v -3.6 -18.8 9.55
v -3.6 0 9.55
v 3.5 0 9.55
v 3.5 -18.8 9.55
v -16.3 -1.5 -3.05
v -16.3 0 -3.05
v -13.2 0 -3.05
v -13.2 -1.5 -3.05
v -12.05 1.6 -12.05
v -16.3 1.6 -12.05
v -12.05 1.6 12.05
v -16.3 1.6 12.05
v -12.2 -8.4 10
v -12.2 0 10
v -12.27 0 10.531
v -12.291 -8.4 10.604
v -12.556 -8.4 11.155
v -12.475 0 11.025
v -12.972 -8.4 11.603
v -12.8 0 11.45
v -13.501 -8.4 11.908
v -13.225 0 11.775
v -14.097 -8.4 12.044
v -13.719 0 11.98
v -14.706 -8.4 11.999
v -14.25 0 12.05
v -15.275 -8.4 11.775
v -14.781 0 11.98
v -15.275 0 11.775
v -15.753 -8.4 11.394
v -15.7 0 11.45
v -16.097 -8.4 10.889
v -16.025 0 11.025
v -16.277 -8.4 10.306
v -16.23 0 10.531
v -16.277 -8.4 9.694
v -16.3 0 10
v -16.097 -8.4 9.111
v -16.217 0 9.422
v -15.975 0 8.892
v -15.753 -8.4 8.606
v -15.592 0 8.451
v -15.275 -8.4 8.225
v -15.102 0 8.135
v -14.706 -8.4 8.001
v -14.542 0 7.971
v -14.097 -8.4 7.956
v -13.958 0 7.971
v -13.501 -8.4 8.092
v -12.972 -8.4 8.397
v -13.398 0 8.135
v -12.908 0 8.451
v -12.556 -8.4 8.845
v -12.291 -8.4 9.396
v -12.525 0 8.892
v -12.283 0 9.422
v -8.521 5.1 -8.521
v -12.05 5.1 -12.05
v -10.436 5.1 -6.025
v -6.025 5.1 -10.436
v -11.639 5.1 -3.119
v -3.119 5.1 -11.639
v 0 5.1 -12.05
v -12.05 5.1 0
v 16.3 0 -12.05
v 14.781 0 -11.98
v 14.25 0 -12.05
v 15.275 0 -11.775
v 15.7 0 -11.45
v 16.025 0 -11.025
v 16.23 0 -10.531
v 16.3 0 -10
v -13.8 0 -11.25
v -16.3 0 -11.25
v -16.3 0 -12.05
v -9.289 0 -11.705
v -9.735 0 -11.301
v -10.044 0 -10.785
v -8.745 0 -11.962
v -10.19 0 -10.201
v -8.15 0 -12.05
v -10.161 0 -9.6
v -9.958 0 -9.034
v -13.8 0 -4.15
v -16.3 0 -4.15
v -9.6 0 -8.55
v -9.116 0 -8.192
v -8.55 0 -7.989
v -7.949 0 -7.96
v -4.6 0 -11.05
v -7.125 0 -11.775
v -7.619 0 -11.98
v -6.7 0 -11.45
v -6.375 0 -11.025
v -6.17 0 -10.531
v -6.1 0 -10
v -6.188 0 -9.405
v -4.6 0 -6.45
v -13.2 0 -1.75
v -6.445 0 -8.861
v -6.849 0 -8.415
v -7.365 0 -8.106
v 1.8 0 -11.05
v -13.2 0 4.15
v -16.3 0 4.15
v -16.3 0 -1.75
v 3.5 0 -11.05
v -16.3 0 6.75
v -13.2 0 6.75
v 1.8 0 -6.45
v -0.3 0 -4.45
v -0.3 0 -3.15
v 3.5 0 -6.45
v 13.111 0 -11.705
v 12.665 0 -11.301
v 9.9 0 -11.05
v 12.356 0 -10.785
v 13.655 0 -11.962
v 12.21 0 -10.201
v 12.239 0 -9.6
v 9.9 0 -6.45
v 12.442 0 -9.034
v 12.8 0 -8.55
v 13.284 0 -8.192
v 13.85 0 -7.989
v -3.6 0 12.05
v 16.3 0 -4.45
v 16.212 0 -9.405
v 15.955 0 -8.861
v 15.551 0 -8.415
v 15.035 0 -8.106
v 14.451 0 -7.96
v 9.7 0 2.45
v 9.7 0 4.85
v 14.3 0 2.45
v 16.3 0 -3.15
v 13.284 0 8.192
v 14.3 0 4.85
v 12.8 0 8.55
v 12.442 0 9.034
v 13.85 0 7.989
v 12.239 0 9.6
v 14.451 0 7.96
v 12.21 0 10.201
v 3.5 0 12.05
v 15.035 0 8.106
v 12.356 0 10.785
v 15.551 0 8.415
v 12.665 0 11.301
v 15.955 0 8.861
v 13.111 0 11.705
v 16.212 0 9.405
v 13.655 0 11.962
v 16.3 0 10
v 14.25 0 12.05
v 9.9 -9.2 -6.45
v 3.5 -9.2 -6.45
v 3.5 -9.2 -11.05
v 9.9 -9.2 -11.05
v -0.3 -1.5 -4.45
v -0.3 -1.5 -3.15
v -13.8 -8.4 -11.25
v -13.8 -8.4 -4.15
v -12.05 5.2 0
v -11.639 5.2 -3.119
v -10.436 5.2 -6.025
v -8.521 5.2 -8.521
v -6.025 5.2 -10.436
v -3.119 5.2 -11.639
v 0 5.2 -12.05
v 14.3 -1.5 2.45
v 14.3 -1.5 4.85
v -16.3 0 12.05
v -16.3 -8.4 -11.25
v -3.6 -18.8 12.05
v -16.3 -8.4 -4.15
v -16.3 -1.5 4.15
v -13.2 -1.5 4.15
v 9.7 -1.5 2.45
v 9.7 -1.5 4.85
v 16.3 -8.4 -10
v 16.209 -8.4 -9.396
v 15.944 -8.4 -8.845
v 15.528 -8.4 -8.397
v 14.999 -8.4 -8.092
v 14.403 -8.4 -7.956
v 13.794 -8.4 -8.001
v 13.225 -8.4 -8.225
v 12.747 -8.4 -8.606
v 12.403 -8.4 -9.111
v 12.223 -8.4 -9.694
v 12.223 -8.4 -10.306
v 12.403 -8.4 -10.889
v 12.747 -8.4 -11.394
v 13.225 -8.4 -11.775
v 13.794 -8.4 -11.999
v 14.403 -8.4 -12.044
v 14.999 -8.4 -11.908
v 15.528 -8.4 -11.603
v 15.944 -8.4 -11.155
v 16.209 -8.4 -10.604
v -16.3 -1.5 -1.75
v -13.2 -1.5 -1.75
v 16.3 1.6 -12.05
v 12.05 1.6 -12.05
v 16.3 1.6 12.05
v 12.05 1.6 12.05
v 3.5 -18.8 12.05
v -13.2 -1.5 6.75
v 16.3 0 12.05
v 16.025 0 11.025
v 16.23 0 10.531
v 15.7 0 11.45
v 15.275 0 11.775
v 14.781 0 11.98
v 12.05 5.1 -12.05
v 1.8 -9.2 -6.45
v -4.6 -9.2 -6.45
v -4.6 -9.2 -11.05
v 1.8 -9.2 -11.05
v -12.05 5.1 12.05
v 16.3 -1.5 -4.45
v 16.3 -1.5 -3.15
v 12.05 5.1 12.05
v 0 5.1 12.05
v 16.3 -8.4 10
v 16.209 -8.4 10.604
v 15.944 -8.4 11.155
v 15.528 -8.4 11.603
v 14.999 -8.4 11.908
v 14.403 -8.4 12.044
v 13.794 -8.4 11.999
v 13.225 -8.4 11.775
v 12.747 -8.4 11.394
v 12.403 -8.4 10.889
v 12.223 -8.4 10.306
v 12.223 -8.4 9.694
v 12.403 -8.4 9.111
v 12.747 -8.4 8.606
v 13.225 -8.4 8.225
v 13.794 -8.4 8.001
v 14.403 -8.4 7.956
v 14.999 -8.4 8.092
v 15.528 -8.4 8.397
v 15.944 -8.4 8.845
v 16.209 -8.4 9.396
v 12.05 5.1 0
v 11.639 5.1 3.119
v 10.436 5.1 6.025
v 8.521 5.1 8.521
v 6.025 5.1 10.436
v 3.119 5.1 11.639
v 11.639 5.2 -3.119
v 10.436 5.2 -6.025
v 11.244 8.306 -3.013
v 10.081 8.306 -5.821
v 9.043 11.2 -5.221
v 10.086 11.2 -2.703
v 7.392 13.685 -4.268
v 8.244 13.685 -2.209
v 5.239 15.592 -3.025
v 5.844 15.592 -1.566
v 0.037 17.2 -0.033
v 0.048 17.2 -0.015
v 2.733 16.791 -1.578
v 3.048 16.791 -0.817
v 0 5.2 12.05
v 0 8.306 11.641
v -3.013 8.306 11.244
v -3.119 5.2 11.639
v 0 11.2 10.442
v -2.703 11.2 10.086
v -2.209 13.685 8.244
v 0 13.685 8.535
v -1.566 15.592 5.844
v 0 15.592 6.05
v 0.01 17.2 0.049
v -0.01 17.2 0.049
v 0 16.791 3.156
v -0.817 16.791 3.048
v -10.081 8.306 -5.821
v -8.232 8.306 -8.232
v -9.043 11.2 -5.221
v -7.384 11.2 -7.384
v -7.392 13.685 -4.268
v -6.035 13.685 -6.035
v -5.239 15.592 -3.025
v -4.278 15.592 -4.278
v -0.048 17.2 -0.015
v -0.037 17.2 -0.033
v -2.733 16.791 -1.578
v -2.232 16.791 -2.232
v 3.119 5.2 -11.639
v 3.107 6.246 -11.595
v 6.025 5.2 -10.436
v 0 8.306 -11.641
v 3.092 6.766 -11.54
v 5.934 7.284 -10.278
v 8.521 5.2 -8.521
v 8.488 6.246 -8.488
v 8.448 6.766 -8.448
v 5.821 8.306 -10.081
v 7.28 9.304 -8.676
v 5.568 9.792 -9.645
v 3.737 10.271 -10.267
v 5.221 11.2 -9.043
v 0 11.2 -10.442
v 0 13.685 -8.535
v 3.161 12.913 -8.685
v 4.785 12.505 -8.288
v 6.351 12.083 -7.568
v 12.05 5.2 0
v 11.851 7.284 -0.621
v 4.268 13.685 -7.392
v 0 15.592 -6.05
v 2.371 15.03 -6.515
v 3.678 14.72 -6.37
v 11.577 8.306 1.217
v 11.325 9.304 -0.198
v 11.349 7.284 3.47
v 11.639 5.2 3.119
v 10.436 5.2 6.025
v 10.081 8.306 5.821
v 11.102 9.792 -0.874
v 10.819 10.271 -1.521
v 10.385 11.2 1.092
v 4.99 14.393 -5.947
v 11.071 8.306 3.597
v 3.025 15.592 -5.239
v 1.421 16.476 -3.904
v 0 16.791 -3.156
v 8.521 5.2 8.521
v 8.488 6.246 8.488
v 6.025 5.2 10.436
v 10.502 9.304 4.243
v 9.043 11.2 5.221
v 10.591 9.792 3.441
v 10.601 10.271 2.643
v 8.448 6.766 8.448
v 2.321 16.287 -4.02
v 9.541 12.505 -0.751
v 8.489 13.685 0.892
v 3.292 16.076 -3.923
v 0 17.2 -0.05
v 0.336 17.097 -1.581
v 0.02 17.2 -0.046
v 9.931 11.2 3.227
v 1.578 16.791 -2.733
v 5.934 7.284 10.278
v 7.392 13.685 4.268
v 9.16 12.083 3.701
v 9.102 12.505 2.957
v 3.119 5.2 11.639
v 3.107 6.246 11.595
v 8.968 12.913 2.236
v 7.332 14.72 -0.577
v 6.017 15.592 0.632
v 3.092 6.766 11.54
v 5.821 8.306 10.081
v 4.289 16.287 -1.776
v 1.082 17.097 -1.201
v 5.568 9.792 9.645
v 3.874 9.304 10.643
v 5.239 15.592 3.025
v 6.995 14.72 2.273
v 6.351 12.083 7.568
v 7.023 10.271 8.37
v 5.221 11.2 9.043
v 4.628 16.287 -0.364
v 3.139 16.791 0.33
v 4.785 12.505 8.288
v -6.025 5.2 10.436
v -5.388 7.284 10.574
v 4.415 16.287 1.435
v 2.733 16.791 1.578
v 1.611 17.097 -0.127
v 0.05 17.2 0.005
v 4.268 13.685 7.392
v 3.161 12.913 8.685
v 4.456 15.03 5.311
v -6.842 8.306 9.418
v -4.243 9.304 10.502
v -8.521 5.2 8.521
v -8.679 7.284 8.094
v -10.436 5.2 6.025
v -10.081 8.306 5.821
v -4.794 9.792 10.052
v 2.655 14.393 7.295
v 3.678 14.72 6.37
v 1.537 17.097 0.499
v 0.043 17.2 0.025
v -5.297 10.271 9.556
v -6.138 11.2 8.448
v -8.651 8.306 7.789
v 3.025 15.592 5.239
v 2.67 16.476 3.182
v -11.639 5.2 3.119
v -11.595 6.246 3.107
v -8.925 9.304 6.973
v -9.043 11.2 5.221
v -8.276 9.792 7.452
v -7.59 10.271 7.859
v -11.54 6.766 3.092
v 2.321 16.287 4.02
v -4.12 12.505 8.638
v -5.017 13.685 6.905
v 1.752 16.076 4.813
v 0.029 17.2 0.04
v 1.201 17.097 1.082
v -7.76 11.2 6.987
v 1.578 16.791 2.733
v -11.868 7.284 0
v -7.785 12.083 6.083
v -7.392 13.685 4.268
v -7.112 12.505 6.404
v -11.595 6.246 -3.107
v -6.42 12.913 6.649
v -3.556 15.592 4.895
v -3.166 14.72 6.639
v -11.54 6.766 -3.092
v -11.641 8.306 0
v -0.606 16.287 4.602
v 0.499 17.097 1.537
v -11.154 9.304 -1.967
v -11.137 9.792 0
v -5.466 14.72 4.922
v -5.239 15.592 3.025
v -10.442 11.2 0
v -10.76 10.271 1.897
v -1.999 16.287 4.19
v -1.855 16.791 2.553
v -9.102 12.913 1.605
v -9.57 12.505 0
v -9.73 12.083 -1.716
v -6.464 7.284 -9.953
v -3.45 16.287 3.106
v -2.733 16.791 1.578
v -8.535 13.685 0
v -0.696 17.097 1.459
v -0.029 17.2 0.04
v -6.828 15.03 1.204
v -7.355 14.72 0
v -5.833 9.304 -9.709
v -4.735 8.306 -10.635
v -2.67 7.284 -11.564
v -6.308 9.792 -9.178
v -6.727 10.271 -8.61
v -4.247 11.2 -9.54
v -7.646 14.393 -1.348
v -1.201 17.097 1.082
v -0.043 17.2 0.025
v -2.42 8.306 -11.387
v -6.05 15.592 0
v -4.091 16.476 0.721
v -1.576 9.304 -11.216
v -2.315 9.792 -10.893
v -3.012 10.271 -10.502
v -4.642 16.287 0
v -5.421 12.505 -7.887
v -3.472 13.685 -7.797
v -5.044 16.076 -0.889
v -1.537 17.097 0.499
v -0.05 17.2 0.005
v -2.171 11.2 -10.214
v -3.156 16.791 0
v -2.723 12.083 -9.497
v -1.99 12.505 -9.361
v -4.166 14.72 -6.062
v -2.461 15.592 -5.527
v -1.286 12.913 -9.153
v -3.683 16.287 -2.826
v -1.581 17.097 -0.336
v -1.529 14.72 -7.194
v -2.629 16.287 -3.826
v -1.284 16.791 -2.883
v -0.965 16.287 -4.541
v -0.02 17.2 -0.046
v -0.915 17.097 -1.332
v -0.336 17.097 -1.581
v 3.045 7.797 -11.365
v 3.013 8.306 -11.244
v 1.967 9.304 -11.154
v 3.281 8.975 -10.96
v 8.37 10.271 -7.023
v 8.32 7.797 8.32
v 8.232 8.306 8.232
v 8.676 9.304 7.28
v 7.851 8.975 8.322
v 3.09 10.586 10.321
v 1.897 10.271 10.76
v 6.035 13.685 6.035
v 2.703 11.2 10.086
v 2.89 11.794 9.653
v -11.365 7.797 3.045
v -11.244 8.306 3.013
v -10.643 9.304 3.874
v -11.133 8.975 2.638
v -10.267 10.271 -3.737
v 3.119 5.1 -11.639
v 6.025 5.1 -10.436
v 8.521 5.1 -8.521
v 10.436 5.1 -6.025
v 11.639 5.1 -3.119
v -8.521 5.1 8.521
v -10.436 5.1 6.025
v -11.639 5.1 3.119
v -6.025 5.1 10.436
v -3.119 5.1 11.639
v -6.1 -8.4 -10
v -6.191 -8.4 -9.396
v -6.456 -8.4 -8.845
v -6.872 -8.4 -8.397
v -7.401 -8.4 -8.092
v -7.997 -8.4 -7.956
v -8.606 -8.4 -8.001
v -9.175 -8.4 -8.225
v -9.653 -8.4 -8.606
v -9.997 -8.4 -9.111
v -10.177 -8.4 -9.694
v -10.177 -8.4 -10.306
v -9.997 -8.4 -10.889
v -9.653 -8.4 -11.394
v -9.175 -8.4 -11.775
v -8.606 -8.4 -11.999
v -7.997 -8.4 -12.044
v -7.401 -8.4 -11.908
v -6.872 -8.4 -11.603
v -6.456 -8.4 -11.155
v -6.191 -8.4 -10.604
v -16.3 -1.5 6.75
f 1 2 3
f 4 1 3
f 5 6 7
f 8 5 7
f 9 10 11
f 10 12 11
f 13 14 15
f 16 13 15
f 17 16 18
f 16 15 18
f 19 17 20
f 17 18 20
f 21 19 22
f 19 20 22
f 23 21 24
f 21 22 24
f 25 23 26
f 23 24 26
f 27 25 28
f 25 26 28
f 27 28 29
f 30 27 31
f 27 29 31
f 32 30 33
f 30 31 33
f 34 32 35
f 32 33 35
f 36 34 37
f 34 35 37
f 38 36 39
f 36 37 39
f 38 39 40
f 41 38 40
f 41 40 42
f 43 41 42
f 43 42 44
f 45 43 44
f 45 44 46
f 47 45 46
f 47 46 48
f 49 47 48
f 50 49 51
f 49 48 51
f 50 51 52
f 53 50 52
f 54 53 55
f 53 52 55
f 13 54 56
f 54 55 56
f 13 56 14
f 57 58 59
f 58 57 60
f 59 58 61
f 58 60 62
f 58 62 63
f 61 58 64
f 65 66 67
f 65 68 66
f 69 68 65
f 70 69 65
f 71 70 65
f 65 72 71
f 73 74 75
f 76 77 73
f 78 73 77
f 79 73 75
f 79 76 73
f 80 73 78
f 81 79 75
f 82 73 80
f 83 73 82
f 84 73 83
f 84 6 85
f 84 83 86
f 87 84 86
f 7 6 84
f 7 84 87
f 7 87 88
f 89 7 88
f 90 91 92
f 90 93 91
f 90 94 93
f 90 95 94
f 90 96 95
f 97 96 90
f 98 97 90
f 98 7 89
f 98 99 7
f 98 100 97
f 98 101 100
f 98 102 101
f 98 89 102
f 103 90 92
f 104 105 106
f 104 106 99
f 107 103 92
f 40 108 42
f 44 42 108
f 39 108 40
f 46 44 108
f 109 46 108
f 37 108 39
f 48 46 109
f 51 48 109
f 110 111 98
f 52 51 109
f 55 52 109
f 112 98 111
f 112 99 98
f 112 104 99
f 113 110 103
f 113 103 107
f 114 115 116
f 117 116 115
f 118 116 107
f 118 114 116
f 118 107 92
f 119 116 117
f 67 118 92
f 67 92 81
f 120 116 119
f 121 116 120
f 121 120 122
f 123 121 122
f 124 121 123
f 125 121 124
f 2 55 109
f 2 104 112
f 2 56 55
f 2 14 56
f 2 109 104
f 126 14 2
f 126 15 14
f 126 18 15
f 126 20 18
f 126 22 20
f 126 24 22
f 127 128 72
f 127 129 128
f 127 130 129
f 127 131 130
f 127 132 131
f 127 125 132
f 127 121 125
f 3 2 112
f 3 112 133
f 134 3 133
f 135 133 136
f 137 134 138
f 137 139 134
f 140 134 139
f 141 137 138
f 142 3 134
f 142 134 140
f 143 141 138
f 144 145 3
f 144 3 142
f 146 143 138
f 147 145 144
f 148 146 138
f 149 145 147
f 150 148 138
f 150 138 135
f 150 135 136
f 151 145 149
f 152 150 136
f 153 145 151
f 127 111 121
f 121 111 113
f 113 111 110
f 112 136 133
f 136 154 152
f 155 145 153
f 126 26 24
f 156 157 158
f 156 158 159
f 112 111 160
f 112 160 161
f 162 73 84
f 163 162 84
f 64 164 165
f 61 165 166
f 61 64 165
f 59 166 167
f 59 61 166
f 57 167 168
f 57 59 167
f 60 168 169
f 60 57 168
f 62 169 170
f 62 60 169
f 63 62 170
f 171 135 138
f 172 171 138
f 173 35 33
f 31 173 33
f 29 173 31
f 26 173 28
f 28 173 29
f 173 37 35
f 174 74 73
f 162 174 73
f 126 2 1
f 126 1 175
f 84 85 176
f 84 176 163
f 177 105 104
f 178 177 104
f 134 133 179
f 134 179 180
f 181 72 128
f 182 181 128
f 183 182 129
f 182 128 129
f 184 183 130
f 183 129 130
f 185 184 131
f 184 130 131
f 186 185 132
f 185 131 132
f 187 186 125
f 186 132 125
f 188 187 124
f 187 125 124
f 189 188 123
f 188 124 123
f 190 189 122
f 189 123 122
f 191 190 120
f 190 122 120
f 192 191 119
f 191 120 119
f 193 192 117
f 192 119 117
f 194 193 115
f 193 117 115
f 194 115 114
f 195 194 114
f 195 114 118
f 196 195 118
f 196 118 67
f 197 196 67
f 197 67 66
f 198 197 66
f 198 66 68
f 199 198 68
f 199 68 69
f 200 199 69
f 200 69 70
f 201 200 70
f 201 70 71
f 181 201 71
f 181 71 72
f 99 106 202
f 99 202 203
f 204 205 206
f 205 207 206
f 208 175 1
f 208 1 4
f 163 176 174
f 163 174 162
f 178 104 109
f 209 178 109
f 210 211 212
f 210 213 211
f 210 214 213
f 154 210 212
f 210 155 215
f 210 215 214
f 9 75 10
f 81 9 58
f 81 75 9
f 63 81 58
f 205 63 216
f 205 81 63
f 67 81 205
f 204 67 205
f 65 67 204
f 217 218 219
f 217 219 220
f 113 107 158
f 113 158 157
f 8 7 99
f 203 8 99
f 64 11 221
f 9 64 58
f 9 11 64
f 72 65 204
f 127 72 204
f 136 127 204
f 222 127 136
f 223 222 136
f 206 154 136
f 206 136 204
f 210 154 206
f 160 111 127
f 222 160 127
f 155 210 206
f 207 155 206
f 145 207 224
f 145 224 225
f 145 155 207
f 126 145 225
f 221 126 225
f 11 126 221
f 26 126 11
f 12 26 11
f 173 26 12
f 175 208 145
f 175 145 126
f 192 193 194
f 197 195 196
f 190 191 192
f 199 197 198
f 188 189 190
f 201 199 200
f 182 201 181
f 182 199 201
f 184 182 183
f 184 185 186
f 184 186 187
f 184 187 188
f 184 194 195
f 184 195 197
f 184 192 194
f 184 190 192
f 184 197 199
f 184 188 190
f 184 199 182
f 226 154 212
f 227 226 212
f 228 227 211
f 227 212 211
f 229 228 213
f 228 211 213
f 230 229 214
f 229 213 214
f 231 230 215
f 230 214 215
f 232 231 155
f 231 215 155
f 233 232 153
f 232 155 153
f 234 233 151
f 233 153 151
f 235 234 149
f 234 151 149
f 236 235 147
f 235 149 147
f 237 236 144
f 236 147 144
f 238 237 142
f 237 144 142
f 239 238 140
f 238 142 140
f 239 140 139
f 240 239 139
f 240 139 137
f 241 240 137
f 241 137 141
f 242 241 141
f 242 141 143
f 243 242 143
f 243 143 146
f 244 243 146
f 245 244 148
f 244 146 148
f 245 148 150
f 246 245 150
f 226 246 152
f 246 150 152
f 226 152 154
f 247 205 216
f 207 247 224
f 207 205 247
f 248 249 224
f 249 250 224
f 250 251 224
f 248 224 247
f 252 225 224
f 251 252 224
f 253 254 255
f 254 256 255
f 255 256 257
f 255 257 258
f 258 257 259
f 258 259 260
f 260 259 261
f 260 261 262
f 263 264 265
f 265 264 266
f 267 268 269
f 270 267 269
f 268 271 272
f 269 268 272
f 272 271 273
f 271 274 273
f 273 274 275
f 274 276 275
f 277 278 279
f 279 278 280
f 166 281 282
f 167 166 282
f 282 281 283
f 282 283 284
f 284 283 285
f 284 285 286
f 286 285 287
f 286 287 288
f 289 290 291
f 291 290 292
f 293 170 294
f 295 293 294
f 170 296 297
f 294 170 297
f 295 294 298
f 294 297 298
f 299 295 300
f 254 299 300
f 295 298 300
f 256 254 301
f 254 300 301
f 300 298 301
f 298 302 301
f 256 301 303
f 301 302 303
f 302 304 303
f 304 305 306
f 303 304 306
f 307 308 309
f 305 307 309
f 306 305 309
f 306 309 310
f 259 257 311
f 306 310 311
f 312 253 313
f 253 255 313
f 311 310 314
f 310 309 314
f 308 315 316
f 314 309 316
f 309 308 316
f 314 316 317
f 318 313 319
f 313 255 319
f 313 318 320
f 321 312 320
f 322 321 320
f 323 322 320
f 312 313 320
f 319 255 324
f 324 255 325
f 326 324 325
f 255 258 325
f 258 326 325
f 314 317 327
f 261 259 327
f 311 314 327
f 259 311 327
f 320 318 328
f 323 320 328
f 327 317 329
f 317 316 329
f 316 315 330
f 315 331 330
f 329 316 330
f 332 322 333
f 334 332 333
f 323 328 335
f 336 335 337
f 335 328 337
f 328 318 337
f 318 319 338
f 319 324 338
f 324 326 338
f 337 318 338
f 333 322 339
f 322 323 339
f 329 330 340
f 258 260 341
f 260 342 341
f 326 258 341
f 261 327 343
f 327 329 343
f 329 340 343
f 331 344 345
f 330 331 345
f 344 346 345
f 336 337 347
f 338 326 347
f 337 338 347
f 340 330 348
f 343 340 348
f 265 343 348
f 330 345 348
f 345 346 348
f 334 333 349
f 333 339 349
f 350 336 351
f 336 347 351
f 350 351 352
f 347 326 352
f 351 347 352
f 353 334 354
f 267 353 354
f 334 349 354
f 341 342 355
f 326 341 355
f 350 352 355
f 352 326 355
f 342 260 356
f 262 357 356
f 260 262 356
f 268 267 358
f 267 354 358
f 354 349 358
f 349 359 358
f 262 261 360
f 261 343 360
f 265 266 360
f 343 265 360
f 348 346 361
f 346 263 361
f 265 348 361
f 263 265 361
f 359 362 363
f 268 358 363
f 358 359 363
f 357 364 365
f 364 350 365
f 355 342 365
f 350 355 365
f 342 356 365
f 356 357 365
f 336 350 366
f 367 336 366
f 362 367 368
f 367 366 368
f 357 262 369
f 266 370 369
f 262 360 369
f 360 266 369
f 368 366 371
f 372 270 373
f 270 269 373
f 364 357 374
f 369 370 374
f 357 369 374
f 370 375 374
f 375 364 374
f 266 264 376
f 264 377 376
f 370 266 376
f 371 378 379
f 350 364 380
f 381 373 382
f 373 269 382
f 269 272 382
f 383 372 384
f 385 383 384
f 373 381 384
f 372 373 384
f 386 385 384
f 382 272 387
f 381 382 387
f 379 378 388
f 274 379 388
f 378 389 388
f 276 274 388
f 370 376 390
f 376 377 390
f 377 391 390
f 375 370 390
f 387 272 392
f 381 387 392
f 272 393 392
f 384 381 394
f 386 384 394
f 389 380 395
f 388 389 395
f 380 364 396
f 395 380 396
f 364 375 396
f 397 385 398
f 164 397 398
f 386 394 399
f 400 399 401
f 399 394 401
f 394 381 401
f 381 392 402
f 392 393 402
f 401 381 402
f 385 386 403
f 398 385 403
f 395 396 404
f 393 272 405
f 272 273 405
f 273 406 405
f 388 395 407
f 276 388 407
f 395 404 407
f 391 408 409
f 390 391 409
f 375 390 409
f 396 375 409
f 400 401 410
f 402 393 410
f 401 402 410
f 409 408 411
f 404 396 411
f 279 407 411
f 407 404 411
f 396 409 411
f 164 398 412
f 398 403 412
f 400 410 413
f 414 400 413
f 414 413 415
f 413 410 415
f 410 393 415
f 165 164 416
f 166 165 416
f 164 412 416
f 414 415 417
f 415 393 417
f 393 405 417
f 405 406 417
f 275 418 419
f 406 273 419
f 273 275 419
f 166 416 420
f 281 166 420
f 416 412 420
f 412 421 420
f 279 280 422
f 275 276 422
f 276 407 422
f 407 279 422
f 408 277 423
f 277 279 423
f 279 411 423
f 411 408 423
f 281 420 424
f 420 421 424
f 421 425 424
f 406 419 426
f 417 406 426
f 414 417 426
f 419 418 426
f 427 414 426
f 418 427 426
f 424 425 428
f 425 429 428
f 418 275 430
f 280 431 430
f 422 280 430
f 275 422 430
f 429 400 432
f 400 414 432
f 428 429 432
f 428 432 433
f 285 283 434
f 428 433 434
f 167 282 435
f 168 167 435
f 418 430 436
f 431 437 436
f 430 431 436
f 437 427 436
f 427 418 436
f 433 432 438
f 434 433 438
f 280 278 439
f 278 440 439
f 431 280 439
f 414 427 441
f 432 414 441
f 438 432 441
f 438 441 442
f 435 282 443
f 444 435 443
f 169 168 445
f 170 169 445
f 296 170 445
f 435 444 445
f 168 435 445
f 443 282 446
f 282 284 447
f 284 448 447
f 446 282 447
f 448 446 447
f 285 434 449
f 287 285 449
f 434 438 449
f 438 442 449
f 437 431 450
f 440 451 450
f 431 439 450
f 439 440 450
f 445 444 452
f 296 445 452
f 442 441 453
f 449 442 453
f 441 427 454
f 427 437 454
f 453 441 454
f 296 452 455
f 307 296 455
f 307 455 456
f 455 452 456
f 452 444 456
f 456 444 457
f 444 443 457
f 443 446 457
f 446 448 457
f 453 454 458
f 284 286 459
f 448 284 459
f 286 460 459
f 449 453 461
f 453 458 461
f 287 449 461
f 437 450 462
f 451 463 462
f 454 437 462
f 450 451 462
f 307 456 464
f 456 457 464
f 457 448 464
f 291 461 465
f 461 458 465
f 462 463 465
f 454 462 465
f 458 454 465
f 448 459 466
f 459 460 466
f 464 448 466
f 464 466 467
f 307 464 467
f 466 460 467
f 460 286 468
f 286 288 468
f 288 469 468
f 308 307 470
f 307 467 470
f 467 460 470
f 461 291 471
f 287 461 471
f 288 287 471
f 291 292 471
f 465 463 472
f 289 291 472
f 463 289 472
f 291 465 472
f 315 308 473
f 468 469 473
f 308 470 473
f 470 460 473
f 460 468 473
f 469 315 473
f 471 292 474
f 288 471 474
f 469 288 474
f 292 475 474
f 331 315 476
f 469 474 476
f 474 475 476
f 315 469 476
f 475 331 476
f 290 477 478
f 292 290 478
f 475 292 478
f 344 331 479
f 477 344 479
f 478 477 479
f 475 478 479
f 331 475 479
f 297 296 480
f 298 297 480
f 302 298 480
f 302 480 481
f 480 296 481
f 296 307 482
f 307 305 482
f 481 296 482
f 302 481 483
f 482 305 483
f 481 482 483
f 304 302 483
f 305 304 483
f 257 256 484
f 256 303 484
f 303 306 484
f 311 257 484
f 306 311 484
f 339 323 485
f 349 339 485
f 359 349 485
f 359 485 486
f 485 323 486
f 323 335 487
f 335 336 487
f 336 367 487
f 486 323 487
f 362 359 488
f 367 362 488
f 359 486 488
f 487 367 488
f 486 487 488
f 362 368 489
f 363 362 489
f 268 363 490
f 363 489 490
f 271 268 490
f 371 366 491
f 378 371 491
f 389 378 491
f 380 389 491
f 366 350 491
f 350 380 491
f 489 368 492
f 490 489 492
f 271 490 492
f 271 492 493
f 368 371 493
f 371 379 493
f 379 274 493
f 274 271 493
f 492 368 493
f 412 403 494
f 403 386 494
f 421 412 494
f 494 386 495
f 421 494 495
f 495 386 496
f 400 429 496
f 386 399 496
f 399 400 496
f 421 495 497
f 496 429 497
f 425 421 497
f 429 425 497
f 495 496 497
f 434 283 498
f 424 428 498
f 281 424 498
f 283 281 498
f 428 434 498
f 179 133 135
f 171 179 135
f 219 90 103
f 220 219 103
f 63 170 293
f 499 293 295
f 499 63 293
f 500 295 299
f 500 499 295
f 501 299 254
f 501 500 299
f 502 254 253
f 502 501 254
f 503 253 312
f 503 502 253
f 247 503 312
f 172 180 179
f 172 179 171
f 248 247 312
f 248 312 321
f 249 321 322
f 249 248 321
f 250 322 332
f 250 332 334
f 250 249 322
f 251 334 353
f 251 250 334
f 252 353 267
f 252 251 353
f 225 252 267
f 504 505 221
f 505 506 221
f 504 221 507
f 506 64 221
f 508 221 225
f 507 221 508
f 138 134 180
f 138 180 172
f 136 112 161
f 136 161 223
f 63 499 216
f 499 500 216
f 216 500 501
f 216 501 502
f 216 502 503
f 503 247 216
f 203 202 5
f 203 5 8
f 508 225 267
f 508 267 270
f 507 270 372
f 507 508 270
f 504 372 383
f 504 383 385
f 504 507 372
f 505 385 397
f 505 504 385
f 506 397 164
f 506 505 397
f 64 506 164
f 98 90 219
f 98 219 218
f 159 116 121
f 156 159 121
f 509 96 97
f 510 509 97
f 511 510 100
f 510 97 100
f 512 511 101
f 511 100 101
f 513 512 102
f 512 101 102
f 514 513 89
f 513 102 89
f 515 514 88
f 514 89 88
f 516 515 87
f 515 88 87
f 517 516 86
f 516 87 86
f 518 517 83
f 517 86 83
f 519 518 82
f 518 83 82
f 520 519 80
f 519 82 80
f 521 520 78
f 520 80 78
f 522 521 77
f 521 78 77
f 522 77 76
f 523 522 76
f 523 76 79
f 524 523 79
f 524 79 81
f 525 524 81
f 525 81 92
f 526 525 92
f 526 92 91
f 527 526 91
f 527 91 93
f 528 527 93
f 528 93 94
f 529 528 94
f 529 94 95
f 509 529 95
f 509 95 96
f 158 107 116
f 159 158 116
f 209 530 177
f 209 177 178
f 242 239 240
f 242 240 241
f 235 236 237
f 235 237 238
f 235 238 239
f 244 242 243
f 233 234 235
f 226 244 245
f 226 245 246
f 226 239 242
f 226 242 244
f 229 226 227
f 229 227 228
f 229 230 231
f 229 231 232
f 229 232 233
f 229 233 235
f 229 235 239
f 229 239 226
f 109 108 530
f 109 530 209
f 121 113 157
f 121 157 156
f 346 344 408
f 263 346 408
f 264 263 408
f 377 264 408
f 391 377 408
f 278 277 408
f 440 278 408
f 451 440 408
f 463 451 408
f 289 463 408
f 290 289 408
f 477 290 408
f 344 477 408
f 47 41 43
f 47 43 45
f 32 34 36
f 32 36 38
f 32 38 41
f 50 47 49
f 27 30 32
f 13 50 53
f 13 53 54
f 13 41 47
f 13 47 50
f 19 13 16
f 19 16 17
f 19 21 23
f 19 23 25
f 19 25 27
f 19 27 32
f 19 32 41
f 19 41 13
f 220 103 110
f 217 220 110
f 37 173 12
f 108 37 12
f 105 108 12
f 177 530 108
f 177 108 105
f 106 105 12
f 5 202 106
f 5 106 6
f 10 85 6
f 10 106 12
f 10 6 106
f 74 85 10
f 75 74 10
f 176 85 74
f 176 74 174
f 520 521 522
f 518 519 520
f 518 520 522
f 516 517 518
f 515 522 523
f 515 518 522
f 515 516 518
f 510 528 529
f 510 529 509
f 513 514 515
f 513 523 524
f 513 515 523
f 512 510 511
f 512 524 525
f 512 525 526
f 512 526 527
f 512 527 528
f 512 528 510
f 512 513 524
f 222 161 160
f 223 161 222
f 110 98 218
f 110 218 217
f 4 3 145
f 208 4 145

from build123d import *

# Parameters (mm, degrees)
F2_DEPTH = 1.6
F3_DEPTH = 5.1
F4_DEPTH = 17.2
F1_R     = 2.05
F1_W     = 2.5
F1_H     = 7.1
F1_W_2   = 7.1
F1_H_2   = 2.5
F6_DEPTH = 8.4
F1_W_3   = 6.4
F1_H_3   = 4.6
F7_DEPTH = 9.2
F8_DEPTH = 18.8
F1_W_4   = 3.1
F1_H_4   = 1.3
F1_W_5   = 4.6
F1_H_5   = 2.4
F1_W_6   = 16.6
F1_H_6   = 2.6
F9_DEPTH = 1.5


# Not quite as in the source:
# - a fillet or chamfer that OpenCascade refuses, or shapes differently, is made with other operations: its cross-section is extruded or revolved along the edge and cut away or added


with BuildPart() as f2:
    # F0 (on Front) → F2 (new body)
    with BuildSketch(Plane.XZ):
        Polygon((16.3, -12.05), (16.3, 12.05), (12.05, 12.05), (12.05, 0), (12.05, -12.05), align=None)
        with BuildLine():
            Line((12.05, 0), (12.05, 12.05))
            Line((12.05, 12.05), (0, 12.05))
            ThreePointArc((0, 12.05), (8.5206367133, 8.5206367133), (12.05, 0))
        make_face()
        with BuildLine():
            ThreePointArc((-12.05, 0), (-8.5206367133, 8.5206367133), (0, 12.05))
            Line((0, 12.05), (-12.05, 12.05))
            Line((-12.05, 12.05), (-12.05, 0))
        make_face()
        with BuildLine():
            ThreePointArc((12.05, 0), (8.5206367133, 8.5206367133), (0, 12.05))
            ThreePointArc((0, 12.05), (-8.5206367133, 8.5206367133), (-12.05, 0))
            ThreePointArc((-12.05, 0), (-8.5206367125, -8.5206367141), (2.1e-09, -12.05))
            ThreePointArc((2.1e-09, -12.05), (8.5206367141, -8.5206367125), (12.05, 0))
        make_face()
        with BuildLine():
            Line((12.05, -12.05), (12.05, 0))
            ThreePointArc((12.05, 0), (8.5206367141, -8.5206367125), (2.1e-09, -12.05))
            Line((2.1e-09, -12.05), (12.05, -12.05))
        make_face()
        Polygon((-12.05, 0), (-12.05, 12.05), (-16.3, 12.05), (-16.3, -12.05), (-12.05, -12.05), align=None)
        with BuildLine():
            ThreePointArc((2.1e-09, -12.05), (-8.5206367125, -8.5206367141), (-12.05, 0))
            Line((-12.05, 0), (-12.05, -12.05))
            Line((-12.05, -12.05), (2.1e-09, -12.05))
        make_face()
    extrude(amount=-F2_DEPTH)

    # F0 (on Front) → F3 (join)
    with BuildSketch(Plane.XZ):
        with BuildLine():
            ThreePointArc((2.1e-09, -12.05), (-8.5206367125, -8.5206367141), (-12.05, 0))
            Line((-12.05, 0), (-12.05, -12.05))
            Line((-12.05, -12.05), (2.1e-09, -12.05))
        make_face()
        with BuildLine():
            ThreePointArc((-12.05, 0), (-8.5206367133, 8.5206367133), (0, 12.05))
            Line((0, 12.05), (-12.05, 12.05))
            Line((-12.05, 12.05), (-12.05, 0))
        make_face()
        with BuildLine():
            ThreePointArc((12.05, 0), (8.5206367133, 8.5206367133), (0, 12.05))
            ThreePointArc((0, 12.05), (-8.5206367133, 8.5206367133), (-12.05, 0))
            ThreePointArc((-12.05, 0), (-8.5206367125, -8.5206367141), (2.1e-09, -12.05))
            ThreePointArc((2.1e-09, -12.05), (8.5206367141, -8.5206367125), (12.05, 0))
        make_face()
        with BuildLine():
            Line((12.05, 0), (12.05, 12.05))
            Line((12.05, 12.05), (0, 12.05))
            ThreePointArc((0, 12.05), (8.5206367133, 8.5206367133), (12.05, 0))
        make_face()
        with BuildLine():
            Line((12.05, -12.05), (12.05, 0))
            ThreePointArc((12.05, 0), (8.5206367141, -8.5206367125), (2.1e-09, -12.05))
            Line((2.1e-09, -12.05), (12.05, -12.05))
        make_face()
    extrude(amount=-F3_DEPTH)

    # F0 (on Front) → F4 (join)
    with BuildSketch(Plane.XZ):
        with BuildLine():
            ThreePointArc((12.05, 0), (8.5206367133, 8.5206367133), (0, 12.05))
            ThreePointArc((0, 12.05), (-8.5206367133, 8.5206367133), (-12.05, 0))
            ThreePointArc((-12.05, 0), (-8.5206367125, -8.5206367141), (2.1e-09, -12.05))
            ThreePointArc((2.1e-09, -12.05), (8.5206367141, -8.5206367125), (12.05, 0))
        make_face()
    extrude(amount=-F4_DEPTH)

    # F5: fillet of radius 12 on 1 edges, made by hand

    # F5_s1 → F5_t2 (revolve, cut)
    with BuildSketch(Plane.YZ):
        with BuildLine():
            ThreePointArc((5.2, -12.05), (13.6852813742, -8.5352813742), (17.2, -0.05))
            Line((17.2, -0.05), (17.2, -12.05))
            Line((17.2, -12.05), (5.2, -12.05))
        make_face()
    revolve(axis=Axis((0, 17.2, 0), (0, -1, 0)), mode=Mode.SUBTRACT)

    # F1 (on Front) → F6 (join)
    with BuildSketch(Plane.XZ):
        with Locations((-14.25, 10)):
            Circle(F1_R)
        with Locations((14.25, 10)):
            Circle(F1_R)
        with Locations((14.25, -10)):
            Circle(F1_R)
        with Locations((-8.15, -10)):
            Circle(F1_R)
        with Locations((-15.05, -7.7)):
            Rectangle(F1_W, F1_H)
        with Locations((-0.05, 10.8)):
            Rectangle(F1_W_2, F1_H_2)
    extrude(amount=F6_DEPTH)

    # F1 (on Front) → F7 (join)
    with BuildSketch(Plane.XZ):
        with Locations((-1.4, -8.75)):
            Rectangle(F1_W_3, F1_H_3)
        with Locations((6.7, -8.75)):
            Rectangle(F1_W_3, F1_H_3)
    extrude(amount=F7_DEPTH)

    # F1 (on Front) → F8 (join)
    with BuildSketch(Plane.XZ):
        with Locations((-0.05, 10.8)):
            Rectangle(F1_W_2, F1_H_2)
    extrude(amount=F8_DEPTH)

    # F1 (on Front) → F9 (join)
    with BuildSketch(Plane.XZ):
        with Locations((-14.75, -2.4)):
            Rectangle(F1_W_4, F1_H_4)
        with Locations((12, 3.65)):
            Rectangle(F1_W_5, F1_H_5)
        with Locations((8, -3.8)):
            Rectangle(F1_W_6, F1_H_4)
        with Locations((-14.75, 5.45)):
            Rectangle(F1_W_4, F1_H_6)
    extrude(amount=F9_DEPTH)


solid = f2.part
